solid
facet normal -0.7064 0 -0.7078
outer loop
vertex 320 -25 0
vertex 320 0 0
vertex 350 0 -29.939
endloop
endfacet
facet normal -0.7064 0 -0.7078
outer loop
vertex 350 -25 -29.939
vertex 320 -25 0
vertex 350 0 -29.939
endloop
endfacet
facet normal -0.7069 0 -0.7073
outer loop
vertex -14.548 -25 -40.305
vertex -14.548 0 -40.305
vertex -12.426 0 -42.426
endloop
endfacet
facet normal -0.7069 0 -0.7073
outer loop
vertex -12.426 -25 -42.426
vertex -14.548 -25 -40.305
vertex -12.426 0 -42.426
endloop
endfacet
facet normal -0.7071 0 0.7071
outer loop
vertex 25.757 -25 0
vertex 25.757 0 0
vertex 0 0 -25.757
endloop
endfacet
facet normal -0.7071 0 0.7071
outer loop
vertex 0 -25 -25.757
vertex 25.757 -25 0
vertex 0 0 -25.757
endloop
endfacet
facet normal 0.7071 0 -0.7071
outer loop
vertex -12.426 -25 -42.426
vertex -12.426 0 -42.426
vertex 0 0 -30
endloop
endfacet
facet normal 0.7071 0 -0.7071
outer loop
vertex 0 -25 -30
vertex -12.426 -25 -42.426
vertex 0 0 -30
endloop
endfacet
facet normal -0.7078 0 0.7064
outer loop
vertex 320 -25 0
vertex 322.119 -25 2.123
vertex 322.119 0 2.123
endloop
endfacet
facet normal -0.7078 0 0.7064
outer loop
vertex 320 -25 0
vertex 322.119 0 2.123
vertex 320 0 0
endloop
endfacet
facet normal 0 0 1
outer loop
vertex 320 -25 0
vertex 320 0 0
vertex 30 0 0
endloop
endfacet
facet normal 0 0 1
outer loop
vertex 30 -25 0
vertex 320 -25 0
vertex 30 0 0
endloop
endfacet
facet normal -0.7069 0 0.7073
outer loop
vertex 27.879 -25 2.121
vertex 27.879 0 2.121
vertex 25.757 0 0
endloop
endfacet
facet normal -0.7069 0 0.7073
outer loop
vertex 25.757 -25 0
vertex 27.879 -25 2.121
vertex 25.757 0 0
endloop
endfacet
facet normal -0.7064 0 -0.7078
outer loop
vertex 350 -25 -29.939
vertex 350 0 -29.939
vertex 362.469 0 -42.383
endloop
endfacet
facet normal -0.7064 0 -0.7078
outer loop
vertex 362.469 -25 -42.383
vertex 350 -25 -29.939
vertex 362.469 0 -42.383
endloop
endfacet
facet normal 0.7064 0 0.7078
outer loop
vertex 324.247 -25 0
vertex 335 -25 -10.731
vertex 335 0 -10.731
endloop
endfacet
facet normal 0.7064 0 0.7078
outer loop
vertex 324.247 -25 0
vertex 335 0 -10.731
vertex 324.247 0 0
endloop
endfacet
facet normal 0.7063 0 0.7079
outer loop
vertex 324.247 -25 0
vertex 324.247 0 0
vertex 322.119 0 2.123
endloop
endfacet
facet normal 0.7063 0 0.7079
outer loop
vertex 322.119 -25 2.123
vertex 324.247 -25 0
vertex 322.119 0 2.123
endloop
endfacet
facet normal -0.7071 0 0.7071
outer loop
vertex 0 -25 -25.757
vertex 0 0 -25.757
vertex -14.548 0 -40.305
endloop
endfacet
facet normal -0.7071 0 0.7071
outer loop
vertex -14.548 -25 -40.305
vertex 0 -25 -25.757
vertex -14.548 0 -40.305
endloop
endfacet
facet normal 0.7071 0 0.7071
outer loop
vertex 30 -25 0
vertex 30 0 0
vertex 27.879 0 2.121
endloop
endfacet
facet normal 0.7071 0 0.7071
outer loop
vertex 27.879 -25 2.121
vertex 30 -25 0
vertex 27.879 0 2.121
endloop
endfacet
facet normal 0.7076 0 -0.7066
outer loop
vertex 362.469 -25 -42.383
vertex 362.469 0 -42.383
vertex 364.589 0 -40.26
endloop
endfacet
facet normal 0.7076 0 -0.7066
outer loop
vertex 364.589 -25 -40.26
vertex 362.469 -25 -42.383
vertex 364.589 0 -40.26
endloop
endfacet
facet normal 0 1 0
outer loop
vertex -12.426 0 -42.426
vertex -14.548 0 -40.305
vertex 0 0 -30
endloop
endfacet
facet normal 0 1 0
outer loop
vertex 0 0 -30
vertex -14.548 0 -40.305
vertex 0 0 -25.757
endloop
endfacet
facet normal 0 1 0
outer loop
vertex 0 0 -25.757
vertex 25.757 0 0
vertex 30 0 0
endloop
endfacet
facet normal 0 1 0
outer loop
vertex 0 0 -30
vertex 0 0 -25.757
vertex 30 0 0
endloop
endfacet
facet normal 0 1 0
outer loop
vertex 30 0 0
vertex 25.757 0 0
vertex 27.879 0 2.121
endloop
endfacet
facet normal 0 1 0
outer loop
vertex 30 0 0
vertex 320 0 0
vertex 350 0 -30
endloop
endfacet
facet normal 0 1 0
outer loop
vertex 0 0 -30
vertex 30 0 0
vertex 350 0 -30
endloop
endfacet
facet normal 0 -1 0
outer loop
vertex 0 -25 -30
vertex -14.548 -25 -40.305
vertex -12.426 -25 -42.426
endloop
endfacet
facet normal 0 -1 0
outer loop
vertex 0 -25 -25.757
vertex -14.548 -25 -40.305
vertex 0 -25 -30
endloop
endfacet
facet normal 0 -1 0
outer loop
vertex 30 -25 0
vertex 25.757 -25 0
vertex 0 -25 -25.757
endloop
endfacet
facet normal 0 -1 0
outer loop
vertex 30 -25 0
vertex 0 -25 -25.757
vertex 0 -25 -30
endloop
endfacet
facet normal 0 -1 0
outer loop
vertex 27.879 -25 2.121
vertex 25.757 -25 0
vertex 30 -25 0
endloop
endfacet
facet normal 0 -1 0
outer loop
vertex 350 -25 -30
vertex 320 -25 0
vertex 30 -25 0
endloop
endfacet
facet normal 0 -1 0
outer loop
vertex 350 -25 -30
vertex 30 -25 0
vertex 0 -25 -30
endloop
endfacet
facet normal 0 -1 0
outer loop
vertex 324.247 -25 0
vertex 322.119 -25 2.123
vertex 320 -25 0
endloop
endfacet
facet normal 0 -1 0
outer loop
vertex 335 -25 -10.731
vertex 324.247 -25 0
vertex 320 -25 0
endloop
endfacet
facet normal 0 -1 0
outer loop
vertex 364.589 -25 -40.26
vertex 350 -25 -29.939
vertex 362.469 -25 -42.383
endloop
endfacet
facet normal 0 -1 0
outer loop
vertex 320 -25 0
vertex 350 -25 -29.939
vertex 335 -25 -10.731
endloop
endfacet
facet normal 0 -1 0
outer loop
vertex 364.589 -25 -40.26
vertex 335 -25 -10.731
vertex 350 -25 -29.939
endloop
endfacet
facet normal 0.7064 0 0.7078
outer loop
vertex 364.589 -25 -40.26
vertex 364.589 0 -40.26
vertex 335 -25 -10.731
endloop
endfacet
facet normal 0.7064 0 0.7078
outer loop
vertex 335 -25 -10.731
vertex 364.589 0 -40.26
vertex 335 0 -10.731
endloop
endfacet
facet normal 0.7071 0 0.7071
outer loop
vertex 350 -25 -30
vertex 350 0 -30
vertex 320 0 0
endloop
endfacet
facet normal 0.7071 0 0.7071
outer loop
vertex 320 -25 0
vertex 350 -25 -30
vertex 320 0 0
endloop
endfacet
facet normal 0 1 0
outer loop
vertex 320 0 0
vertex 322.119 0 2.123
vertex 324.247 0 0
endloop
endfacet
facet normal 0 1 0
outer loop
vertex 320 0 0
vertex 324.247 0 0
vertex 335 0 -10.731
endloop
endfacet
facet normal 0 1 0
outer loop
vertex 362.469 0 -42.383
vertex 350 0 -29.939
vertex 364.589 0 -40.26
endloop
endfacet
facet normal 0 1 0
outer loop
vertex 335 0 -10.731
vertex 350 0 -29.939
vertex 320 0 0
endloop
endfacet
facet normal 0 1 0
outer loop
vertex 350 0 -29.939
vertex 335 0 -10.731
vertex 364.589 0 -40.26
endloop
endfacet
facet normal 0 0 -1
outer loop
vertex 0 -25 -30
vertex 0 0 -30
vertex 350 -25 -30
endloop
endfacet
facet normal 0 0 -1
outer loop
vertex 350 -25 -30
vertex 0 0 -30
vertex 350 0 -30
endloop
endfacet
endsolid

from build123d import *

# Parameters (mm, degrees)
F1_DEPTH = 25


with BuildPart() as f1:
    # F0 (on Front) → F1 (new body)
    with BuildSketch(Plane.XZ):
        Polygon((320, 0), (30, 0), (0, -30), (350, -30), align=None)
        Polygon((0, -30), (30, 0), (25.7573593129, 0), (0, -25.7573593129), align=None)
        Polygon((-12.4264068712, -42.4264068712), (0, -30), (0, -25.7573593129), (-14.5477272148, -40.3050865276), align=None)
        Polygon((25.7573593129, 0), (30, 0), (27.8786796564, 2.1213203436), align=None)
    extrude(amount=F1_DEPTH)


with BuildPart() as f1b:
    # F0 (on Front) → F1, piece 2 (new body)
    with BuildSketch(Plane.XZ):
        Polygon((324.2469506412, 0), (320, 0), (350, -29.9392024028), (350, -25.7008585747), (335, -10.7312573733), align=None)
        Polygon((322.1191675534, 2.1234709512), (320, 0), (324.2469506412, 0), align=None)
        Polygon((350, -25.7008585747), (350, -29.9392024028), (362.4694190233, -42.3833510688), (364.5885865767, -40.2598801177), align=None)
    extrude(amount=F1_DEPTH)


solid = Compound([f1.part, f1b.part])
